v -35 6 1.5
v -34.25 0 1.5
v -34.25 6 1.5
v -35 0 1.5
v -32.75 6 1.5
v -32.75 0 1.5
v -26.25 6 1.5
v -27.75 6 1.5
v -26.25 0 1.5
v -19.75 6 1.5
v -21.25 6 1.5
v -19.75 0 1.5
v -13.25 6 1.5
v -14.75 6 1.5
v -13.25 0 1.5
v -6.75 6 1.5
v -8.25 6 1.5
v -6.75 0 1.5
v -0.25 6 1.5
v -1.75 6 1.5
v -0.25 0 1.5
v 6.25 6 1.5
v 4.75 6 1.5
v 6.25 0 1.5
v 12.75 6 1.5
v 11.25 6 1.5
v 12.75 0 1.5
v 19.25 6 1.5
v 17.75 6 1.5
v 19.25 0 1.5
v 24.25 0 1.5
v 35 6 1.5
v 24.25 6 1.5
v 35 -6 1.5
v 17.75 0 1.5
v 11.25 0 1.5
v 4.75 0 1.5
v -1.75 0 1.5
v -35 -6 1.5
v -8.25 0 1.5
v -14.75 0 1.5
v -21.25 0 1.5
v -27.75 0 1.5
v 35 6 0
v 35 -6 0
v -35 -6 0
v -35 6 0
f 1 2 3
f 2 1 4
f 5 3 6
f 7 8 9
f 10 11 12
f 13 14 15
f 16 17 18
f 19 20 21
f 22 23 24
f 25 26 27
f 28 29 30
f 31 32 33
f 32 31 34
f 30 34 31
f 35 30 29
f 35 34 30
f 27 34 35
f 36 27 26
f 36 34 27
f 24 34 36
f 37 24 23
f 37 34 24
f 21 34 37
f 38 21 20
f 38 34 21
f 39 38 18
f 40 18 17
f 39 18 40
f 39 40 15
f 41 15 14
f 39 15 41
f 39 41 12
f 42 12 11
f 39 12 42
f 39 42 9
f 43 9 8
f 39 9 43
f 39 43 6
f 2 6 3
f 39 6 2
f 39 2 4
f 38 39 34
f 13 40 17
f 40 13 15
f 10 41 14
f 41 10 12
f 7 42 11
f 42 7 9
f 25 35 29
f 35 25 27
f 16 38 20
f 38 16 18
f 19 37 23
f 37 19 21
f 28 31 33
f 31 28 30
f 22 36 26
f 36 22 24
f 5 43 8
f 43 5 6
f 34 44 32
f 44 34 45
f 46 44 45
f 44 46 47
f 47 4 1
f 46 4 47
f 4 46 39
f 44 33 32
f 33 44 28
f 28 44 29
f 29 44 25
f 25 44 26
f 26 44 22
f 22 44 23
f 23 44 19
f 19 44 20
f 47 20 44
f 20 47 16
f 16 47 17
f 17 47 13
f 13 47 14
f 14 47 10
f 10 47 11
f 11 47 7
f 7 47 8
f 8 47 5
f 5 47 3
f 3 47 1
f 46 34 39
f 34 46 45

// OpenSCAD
// 10-well agarose gel comb, printed lying flat
// Units: mm

// ---- Spine ----
spine_len   = 70;    // spine length along X
spine_wid   = 12;    // spine width along Y
plate_thk   = 1.5;   // plate thickness (Z)

// ---- Teeth ----
tooth_count = 10;    // number of wells
tooth_w     = 5.0;   // tooth width along X
tooth_l     = 12;    // tooth length along Y (from top edge of spine)
gap         = 1.5;   // gap between neighbouring teeth

// ---- Misc ----
eps         = 0.5;   // cutter overshoot past faces
$fn         = 64;

// Derived
pitch       = tooth_w + gap;                 // centre-to-centre spacing
row_span    = (tooth_count - 1) * gap;       // total gap width
x_start     = -spine_len/2 + tooth_w/2 - row_span/2; // first tooth centre X

difference() {
    // Base plate
    translate([-spine_len/2, -spine_wid/2, 0])
        cube([spine_len, spine_wid, plate_thk]);

    // Teeth cut out from the top edge, hanging in -Y
    for (i = [0 : tooth_count - 1]) {
        translate([x_start + i * pitch, 0, plate_thk])
            cube([tooth_w, tooth_l + eps, eps]);
    }
}
